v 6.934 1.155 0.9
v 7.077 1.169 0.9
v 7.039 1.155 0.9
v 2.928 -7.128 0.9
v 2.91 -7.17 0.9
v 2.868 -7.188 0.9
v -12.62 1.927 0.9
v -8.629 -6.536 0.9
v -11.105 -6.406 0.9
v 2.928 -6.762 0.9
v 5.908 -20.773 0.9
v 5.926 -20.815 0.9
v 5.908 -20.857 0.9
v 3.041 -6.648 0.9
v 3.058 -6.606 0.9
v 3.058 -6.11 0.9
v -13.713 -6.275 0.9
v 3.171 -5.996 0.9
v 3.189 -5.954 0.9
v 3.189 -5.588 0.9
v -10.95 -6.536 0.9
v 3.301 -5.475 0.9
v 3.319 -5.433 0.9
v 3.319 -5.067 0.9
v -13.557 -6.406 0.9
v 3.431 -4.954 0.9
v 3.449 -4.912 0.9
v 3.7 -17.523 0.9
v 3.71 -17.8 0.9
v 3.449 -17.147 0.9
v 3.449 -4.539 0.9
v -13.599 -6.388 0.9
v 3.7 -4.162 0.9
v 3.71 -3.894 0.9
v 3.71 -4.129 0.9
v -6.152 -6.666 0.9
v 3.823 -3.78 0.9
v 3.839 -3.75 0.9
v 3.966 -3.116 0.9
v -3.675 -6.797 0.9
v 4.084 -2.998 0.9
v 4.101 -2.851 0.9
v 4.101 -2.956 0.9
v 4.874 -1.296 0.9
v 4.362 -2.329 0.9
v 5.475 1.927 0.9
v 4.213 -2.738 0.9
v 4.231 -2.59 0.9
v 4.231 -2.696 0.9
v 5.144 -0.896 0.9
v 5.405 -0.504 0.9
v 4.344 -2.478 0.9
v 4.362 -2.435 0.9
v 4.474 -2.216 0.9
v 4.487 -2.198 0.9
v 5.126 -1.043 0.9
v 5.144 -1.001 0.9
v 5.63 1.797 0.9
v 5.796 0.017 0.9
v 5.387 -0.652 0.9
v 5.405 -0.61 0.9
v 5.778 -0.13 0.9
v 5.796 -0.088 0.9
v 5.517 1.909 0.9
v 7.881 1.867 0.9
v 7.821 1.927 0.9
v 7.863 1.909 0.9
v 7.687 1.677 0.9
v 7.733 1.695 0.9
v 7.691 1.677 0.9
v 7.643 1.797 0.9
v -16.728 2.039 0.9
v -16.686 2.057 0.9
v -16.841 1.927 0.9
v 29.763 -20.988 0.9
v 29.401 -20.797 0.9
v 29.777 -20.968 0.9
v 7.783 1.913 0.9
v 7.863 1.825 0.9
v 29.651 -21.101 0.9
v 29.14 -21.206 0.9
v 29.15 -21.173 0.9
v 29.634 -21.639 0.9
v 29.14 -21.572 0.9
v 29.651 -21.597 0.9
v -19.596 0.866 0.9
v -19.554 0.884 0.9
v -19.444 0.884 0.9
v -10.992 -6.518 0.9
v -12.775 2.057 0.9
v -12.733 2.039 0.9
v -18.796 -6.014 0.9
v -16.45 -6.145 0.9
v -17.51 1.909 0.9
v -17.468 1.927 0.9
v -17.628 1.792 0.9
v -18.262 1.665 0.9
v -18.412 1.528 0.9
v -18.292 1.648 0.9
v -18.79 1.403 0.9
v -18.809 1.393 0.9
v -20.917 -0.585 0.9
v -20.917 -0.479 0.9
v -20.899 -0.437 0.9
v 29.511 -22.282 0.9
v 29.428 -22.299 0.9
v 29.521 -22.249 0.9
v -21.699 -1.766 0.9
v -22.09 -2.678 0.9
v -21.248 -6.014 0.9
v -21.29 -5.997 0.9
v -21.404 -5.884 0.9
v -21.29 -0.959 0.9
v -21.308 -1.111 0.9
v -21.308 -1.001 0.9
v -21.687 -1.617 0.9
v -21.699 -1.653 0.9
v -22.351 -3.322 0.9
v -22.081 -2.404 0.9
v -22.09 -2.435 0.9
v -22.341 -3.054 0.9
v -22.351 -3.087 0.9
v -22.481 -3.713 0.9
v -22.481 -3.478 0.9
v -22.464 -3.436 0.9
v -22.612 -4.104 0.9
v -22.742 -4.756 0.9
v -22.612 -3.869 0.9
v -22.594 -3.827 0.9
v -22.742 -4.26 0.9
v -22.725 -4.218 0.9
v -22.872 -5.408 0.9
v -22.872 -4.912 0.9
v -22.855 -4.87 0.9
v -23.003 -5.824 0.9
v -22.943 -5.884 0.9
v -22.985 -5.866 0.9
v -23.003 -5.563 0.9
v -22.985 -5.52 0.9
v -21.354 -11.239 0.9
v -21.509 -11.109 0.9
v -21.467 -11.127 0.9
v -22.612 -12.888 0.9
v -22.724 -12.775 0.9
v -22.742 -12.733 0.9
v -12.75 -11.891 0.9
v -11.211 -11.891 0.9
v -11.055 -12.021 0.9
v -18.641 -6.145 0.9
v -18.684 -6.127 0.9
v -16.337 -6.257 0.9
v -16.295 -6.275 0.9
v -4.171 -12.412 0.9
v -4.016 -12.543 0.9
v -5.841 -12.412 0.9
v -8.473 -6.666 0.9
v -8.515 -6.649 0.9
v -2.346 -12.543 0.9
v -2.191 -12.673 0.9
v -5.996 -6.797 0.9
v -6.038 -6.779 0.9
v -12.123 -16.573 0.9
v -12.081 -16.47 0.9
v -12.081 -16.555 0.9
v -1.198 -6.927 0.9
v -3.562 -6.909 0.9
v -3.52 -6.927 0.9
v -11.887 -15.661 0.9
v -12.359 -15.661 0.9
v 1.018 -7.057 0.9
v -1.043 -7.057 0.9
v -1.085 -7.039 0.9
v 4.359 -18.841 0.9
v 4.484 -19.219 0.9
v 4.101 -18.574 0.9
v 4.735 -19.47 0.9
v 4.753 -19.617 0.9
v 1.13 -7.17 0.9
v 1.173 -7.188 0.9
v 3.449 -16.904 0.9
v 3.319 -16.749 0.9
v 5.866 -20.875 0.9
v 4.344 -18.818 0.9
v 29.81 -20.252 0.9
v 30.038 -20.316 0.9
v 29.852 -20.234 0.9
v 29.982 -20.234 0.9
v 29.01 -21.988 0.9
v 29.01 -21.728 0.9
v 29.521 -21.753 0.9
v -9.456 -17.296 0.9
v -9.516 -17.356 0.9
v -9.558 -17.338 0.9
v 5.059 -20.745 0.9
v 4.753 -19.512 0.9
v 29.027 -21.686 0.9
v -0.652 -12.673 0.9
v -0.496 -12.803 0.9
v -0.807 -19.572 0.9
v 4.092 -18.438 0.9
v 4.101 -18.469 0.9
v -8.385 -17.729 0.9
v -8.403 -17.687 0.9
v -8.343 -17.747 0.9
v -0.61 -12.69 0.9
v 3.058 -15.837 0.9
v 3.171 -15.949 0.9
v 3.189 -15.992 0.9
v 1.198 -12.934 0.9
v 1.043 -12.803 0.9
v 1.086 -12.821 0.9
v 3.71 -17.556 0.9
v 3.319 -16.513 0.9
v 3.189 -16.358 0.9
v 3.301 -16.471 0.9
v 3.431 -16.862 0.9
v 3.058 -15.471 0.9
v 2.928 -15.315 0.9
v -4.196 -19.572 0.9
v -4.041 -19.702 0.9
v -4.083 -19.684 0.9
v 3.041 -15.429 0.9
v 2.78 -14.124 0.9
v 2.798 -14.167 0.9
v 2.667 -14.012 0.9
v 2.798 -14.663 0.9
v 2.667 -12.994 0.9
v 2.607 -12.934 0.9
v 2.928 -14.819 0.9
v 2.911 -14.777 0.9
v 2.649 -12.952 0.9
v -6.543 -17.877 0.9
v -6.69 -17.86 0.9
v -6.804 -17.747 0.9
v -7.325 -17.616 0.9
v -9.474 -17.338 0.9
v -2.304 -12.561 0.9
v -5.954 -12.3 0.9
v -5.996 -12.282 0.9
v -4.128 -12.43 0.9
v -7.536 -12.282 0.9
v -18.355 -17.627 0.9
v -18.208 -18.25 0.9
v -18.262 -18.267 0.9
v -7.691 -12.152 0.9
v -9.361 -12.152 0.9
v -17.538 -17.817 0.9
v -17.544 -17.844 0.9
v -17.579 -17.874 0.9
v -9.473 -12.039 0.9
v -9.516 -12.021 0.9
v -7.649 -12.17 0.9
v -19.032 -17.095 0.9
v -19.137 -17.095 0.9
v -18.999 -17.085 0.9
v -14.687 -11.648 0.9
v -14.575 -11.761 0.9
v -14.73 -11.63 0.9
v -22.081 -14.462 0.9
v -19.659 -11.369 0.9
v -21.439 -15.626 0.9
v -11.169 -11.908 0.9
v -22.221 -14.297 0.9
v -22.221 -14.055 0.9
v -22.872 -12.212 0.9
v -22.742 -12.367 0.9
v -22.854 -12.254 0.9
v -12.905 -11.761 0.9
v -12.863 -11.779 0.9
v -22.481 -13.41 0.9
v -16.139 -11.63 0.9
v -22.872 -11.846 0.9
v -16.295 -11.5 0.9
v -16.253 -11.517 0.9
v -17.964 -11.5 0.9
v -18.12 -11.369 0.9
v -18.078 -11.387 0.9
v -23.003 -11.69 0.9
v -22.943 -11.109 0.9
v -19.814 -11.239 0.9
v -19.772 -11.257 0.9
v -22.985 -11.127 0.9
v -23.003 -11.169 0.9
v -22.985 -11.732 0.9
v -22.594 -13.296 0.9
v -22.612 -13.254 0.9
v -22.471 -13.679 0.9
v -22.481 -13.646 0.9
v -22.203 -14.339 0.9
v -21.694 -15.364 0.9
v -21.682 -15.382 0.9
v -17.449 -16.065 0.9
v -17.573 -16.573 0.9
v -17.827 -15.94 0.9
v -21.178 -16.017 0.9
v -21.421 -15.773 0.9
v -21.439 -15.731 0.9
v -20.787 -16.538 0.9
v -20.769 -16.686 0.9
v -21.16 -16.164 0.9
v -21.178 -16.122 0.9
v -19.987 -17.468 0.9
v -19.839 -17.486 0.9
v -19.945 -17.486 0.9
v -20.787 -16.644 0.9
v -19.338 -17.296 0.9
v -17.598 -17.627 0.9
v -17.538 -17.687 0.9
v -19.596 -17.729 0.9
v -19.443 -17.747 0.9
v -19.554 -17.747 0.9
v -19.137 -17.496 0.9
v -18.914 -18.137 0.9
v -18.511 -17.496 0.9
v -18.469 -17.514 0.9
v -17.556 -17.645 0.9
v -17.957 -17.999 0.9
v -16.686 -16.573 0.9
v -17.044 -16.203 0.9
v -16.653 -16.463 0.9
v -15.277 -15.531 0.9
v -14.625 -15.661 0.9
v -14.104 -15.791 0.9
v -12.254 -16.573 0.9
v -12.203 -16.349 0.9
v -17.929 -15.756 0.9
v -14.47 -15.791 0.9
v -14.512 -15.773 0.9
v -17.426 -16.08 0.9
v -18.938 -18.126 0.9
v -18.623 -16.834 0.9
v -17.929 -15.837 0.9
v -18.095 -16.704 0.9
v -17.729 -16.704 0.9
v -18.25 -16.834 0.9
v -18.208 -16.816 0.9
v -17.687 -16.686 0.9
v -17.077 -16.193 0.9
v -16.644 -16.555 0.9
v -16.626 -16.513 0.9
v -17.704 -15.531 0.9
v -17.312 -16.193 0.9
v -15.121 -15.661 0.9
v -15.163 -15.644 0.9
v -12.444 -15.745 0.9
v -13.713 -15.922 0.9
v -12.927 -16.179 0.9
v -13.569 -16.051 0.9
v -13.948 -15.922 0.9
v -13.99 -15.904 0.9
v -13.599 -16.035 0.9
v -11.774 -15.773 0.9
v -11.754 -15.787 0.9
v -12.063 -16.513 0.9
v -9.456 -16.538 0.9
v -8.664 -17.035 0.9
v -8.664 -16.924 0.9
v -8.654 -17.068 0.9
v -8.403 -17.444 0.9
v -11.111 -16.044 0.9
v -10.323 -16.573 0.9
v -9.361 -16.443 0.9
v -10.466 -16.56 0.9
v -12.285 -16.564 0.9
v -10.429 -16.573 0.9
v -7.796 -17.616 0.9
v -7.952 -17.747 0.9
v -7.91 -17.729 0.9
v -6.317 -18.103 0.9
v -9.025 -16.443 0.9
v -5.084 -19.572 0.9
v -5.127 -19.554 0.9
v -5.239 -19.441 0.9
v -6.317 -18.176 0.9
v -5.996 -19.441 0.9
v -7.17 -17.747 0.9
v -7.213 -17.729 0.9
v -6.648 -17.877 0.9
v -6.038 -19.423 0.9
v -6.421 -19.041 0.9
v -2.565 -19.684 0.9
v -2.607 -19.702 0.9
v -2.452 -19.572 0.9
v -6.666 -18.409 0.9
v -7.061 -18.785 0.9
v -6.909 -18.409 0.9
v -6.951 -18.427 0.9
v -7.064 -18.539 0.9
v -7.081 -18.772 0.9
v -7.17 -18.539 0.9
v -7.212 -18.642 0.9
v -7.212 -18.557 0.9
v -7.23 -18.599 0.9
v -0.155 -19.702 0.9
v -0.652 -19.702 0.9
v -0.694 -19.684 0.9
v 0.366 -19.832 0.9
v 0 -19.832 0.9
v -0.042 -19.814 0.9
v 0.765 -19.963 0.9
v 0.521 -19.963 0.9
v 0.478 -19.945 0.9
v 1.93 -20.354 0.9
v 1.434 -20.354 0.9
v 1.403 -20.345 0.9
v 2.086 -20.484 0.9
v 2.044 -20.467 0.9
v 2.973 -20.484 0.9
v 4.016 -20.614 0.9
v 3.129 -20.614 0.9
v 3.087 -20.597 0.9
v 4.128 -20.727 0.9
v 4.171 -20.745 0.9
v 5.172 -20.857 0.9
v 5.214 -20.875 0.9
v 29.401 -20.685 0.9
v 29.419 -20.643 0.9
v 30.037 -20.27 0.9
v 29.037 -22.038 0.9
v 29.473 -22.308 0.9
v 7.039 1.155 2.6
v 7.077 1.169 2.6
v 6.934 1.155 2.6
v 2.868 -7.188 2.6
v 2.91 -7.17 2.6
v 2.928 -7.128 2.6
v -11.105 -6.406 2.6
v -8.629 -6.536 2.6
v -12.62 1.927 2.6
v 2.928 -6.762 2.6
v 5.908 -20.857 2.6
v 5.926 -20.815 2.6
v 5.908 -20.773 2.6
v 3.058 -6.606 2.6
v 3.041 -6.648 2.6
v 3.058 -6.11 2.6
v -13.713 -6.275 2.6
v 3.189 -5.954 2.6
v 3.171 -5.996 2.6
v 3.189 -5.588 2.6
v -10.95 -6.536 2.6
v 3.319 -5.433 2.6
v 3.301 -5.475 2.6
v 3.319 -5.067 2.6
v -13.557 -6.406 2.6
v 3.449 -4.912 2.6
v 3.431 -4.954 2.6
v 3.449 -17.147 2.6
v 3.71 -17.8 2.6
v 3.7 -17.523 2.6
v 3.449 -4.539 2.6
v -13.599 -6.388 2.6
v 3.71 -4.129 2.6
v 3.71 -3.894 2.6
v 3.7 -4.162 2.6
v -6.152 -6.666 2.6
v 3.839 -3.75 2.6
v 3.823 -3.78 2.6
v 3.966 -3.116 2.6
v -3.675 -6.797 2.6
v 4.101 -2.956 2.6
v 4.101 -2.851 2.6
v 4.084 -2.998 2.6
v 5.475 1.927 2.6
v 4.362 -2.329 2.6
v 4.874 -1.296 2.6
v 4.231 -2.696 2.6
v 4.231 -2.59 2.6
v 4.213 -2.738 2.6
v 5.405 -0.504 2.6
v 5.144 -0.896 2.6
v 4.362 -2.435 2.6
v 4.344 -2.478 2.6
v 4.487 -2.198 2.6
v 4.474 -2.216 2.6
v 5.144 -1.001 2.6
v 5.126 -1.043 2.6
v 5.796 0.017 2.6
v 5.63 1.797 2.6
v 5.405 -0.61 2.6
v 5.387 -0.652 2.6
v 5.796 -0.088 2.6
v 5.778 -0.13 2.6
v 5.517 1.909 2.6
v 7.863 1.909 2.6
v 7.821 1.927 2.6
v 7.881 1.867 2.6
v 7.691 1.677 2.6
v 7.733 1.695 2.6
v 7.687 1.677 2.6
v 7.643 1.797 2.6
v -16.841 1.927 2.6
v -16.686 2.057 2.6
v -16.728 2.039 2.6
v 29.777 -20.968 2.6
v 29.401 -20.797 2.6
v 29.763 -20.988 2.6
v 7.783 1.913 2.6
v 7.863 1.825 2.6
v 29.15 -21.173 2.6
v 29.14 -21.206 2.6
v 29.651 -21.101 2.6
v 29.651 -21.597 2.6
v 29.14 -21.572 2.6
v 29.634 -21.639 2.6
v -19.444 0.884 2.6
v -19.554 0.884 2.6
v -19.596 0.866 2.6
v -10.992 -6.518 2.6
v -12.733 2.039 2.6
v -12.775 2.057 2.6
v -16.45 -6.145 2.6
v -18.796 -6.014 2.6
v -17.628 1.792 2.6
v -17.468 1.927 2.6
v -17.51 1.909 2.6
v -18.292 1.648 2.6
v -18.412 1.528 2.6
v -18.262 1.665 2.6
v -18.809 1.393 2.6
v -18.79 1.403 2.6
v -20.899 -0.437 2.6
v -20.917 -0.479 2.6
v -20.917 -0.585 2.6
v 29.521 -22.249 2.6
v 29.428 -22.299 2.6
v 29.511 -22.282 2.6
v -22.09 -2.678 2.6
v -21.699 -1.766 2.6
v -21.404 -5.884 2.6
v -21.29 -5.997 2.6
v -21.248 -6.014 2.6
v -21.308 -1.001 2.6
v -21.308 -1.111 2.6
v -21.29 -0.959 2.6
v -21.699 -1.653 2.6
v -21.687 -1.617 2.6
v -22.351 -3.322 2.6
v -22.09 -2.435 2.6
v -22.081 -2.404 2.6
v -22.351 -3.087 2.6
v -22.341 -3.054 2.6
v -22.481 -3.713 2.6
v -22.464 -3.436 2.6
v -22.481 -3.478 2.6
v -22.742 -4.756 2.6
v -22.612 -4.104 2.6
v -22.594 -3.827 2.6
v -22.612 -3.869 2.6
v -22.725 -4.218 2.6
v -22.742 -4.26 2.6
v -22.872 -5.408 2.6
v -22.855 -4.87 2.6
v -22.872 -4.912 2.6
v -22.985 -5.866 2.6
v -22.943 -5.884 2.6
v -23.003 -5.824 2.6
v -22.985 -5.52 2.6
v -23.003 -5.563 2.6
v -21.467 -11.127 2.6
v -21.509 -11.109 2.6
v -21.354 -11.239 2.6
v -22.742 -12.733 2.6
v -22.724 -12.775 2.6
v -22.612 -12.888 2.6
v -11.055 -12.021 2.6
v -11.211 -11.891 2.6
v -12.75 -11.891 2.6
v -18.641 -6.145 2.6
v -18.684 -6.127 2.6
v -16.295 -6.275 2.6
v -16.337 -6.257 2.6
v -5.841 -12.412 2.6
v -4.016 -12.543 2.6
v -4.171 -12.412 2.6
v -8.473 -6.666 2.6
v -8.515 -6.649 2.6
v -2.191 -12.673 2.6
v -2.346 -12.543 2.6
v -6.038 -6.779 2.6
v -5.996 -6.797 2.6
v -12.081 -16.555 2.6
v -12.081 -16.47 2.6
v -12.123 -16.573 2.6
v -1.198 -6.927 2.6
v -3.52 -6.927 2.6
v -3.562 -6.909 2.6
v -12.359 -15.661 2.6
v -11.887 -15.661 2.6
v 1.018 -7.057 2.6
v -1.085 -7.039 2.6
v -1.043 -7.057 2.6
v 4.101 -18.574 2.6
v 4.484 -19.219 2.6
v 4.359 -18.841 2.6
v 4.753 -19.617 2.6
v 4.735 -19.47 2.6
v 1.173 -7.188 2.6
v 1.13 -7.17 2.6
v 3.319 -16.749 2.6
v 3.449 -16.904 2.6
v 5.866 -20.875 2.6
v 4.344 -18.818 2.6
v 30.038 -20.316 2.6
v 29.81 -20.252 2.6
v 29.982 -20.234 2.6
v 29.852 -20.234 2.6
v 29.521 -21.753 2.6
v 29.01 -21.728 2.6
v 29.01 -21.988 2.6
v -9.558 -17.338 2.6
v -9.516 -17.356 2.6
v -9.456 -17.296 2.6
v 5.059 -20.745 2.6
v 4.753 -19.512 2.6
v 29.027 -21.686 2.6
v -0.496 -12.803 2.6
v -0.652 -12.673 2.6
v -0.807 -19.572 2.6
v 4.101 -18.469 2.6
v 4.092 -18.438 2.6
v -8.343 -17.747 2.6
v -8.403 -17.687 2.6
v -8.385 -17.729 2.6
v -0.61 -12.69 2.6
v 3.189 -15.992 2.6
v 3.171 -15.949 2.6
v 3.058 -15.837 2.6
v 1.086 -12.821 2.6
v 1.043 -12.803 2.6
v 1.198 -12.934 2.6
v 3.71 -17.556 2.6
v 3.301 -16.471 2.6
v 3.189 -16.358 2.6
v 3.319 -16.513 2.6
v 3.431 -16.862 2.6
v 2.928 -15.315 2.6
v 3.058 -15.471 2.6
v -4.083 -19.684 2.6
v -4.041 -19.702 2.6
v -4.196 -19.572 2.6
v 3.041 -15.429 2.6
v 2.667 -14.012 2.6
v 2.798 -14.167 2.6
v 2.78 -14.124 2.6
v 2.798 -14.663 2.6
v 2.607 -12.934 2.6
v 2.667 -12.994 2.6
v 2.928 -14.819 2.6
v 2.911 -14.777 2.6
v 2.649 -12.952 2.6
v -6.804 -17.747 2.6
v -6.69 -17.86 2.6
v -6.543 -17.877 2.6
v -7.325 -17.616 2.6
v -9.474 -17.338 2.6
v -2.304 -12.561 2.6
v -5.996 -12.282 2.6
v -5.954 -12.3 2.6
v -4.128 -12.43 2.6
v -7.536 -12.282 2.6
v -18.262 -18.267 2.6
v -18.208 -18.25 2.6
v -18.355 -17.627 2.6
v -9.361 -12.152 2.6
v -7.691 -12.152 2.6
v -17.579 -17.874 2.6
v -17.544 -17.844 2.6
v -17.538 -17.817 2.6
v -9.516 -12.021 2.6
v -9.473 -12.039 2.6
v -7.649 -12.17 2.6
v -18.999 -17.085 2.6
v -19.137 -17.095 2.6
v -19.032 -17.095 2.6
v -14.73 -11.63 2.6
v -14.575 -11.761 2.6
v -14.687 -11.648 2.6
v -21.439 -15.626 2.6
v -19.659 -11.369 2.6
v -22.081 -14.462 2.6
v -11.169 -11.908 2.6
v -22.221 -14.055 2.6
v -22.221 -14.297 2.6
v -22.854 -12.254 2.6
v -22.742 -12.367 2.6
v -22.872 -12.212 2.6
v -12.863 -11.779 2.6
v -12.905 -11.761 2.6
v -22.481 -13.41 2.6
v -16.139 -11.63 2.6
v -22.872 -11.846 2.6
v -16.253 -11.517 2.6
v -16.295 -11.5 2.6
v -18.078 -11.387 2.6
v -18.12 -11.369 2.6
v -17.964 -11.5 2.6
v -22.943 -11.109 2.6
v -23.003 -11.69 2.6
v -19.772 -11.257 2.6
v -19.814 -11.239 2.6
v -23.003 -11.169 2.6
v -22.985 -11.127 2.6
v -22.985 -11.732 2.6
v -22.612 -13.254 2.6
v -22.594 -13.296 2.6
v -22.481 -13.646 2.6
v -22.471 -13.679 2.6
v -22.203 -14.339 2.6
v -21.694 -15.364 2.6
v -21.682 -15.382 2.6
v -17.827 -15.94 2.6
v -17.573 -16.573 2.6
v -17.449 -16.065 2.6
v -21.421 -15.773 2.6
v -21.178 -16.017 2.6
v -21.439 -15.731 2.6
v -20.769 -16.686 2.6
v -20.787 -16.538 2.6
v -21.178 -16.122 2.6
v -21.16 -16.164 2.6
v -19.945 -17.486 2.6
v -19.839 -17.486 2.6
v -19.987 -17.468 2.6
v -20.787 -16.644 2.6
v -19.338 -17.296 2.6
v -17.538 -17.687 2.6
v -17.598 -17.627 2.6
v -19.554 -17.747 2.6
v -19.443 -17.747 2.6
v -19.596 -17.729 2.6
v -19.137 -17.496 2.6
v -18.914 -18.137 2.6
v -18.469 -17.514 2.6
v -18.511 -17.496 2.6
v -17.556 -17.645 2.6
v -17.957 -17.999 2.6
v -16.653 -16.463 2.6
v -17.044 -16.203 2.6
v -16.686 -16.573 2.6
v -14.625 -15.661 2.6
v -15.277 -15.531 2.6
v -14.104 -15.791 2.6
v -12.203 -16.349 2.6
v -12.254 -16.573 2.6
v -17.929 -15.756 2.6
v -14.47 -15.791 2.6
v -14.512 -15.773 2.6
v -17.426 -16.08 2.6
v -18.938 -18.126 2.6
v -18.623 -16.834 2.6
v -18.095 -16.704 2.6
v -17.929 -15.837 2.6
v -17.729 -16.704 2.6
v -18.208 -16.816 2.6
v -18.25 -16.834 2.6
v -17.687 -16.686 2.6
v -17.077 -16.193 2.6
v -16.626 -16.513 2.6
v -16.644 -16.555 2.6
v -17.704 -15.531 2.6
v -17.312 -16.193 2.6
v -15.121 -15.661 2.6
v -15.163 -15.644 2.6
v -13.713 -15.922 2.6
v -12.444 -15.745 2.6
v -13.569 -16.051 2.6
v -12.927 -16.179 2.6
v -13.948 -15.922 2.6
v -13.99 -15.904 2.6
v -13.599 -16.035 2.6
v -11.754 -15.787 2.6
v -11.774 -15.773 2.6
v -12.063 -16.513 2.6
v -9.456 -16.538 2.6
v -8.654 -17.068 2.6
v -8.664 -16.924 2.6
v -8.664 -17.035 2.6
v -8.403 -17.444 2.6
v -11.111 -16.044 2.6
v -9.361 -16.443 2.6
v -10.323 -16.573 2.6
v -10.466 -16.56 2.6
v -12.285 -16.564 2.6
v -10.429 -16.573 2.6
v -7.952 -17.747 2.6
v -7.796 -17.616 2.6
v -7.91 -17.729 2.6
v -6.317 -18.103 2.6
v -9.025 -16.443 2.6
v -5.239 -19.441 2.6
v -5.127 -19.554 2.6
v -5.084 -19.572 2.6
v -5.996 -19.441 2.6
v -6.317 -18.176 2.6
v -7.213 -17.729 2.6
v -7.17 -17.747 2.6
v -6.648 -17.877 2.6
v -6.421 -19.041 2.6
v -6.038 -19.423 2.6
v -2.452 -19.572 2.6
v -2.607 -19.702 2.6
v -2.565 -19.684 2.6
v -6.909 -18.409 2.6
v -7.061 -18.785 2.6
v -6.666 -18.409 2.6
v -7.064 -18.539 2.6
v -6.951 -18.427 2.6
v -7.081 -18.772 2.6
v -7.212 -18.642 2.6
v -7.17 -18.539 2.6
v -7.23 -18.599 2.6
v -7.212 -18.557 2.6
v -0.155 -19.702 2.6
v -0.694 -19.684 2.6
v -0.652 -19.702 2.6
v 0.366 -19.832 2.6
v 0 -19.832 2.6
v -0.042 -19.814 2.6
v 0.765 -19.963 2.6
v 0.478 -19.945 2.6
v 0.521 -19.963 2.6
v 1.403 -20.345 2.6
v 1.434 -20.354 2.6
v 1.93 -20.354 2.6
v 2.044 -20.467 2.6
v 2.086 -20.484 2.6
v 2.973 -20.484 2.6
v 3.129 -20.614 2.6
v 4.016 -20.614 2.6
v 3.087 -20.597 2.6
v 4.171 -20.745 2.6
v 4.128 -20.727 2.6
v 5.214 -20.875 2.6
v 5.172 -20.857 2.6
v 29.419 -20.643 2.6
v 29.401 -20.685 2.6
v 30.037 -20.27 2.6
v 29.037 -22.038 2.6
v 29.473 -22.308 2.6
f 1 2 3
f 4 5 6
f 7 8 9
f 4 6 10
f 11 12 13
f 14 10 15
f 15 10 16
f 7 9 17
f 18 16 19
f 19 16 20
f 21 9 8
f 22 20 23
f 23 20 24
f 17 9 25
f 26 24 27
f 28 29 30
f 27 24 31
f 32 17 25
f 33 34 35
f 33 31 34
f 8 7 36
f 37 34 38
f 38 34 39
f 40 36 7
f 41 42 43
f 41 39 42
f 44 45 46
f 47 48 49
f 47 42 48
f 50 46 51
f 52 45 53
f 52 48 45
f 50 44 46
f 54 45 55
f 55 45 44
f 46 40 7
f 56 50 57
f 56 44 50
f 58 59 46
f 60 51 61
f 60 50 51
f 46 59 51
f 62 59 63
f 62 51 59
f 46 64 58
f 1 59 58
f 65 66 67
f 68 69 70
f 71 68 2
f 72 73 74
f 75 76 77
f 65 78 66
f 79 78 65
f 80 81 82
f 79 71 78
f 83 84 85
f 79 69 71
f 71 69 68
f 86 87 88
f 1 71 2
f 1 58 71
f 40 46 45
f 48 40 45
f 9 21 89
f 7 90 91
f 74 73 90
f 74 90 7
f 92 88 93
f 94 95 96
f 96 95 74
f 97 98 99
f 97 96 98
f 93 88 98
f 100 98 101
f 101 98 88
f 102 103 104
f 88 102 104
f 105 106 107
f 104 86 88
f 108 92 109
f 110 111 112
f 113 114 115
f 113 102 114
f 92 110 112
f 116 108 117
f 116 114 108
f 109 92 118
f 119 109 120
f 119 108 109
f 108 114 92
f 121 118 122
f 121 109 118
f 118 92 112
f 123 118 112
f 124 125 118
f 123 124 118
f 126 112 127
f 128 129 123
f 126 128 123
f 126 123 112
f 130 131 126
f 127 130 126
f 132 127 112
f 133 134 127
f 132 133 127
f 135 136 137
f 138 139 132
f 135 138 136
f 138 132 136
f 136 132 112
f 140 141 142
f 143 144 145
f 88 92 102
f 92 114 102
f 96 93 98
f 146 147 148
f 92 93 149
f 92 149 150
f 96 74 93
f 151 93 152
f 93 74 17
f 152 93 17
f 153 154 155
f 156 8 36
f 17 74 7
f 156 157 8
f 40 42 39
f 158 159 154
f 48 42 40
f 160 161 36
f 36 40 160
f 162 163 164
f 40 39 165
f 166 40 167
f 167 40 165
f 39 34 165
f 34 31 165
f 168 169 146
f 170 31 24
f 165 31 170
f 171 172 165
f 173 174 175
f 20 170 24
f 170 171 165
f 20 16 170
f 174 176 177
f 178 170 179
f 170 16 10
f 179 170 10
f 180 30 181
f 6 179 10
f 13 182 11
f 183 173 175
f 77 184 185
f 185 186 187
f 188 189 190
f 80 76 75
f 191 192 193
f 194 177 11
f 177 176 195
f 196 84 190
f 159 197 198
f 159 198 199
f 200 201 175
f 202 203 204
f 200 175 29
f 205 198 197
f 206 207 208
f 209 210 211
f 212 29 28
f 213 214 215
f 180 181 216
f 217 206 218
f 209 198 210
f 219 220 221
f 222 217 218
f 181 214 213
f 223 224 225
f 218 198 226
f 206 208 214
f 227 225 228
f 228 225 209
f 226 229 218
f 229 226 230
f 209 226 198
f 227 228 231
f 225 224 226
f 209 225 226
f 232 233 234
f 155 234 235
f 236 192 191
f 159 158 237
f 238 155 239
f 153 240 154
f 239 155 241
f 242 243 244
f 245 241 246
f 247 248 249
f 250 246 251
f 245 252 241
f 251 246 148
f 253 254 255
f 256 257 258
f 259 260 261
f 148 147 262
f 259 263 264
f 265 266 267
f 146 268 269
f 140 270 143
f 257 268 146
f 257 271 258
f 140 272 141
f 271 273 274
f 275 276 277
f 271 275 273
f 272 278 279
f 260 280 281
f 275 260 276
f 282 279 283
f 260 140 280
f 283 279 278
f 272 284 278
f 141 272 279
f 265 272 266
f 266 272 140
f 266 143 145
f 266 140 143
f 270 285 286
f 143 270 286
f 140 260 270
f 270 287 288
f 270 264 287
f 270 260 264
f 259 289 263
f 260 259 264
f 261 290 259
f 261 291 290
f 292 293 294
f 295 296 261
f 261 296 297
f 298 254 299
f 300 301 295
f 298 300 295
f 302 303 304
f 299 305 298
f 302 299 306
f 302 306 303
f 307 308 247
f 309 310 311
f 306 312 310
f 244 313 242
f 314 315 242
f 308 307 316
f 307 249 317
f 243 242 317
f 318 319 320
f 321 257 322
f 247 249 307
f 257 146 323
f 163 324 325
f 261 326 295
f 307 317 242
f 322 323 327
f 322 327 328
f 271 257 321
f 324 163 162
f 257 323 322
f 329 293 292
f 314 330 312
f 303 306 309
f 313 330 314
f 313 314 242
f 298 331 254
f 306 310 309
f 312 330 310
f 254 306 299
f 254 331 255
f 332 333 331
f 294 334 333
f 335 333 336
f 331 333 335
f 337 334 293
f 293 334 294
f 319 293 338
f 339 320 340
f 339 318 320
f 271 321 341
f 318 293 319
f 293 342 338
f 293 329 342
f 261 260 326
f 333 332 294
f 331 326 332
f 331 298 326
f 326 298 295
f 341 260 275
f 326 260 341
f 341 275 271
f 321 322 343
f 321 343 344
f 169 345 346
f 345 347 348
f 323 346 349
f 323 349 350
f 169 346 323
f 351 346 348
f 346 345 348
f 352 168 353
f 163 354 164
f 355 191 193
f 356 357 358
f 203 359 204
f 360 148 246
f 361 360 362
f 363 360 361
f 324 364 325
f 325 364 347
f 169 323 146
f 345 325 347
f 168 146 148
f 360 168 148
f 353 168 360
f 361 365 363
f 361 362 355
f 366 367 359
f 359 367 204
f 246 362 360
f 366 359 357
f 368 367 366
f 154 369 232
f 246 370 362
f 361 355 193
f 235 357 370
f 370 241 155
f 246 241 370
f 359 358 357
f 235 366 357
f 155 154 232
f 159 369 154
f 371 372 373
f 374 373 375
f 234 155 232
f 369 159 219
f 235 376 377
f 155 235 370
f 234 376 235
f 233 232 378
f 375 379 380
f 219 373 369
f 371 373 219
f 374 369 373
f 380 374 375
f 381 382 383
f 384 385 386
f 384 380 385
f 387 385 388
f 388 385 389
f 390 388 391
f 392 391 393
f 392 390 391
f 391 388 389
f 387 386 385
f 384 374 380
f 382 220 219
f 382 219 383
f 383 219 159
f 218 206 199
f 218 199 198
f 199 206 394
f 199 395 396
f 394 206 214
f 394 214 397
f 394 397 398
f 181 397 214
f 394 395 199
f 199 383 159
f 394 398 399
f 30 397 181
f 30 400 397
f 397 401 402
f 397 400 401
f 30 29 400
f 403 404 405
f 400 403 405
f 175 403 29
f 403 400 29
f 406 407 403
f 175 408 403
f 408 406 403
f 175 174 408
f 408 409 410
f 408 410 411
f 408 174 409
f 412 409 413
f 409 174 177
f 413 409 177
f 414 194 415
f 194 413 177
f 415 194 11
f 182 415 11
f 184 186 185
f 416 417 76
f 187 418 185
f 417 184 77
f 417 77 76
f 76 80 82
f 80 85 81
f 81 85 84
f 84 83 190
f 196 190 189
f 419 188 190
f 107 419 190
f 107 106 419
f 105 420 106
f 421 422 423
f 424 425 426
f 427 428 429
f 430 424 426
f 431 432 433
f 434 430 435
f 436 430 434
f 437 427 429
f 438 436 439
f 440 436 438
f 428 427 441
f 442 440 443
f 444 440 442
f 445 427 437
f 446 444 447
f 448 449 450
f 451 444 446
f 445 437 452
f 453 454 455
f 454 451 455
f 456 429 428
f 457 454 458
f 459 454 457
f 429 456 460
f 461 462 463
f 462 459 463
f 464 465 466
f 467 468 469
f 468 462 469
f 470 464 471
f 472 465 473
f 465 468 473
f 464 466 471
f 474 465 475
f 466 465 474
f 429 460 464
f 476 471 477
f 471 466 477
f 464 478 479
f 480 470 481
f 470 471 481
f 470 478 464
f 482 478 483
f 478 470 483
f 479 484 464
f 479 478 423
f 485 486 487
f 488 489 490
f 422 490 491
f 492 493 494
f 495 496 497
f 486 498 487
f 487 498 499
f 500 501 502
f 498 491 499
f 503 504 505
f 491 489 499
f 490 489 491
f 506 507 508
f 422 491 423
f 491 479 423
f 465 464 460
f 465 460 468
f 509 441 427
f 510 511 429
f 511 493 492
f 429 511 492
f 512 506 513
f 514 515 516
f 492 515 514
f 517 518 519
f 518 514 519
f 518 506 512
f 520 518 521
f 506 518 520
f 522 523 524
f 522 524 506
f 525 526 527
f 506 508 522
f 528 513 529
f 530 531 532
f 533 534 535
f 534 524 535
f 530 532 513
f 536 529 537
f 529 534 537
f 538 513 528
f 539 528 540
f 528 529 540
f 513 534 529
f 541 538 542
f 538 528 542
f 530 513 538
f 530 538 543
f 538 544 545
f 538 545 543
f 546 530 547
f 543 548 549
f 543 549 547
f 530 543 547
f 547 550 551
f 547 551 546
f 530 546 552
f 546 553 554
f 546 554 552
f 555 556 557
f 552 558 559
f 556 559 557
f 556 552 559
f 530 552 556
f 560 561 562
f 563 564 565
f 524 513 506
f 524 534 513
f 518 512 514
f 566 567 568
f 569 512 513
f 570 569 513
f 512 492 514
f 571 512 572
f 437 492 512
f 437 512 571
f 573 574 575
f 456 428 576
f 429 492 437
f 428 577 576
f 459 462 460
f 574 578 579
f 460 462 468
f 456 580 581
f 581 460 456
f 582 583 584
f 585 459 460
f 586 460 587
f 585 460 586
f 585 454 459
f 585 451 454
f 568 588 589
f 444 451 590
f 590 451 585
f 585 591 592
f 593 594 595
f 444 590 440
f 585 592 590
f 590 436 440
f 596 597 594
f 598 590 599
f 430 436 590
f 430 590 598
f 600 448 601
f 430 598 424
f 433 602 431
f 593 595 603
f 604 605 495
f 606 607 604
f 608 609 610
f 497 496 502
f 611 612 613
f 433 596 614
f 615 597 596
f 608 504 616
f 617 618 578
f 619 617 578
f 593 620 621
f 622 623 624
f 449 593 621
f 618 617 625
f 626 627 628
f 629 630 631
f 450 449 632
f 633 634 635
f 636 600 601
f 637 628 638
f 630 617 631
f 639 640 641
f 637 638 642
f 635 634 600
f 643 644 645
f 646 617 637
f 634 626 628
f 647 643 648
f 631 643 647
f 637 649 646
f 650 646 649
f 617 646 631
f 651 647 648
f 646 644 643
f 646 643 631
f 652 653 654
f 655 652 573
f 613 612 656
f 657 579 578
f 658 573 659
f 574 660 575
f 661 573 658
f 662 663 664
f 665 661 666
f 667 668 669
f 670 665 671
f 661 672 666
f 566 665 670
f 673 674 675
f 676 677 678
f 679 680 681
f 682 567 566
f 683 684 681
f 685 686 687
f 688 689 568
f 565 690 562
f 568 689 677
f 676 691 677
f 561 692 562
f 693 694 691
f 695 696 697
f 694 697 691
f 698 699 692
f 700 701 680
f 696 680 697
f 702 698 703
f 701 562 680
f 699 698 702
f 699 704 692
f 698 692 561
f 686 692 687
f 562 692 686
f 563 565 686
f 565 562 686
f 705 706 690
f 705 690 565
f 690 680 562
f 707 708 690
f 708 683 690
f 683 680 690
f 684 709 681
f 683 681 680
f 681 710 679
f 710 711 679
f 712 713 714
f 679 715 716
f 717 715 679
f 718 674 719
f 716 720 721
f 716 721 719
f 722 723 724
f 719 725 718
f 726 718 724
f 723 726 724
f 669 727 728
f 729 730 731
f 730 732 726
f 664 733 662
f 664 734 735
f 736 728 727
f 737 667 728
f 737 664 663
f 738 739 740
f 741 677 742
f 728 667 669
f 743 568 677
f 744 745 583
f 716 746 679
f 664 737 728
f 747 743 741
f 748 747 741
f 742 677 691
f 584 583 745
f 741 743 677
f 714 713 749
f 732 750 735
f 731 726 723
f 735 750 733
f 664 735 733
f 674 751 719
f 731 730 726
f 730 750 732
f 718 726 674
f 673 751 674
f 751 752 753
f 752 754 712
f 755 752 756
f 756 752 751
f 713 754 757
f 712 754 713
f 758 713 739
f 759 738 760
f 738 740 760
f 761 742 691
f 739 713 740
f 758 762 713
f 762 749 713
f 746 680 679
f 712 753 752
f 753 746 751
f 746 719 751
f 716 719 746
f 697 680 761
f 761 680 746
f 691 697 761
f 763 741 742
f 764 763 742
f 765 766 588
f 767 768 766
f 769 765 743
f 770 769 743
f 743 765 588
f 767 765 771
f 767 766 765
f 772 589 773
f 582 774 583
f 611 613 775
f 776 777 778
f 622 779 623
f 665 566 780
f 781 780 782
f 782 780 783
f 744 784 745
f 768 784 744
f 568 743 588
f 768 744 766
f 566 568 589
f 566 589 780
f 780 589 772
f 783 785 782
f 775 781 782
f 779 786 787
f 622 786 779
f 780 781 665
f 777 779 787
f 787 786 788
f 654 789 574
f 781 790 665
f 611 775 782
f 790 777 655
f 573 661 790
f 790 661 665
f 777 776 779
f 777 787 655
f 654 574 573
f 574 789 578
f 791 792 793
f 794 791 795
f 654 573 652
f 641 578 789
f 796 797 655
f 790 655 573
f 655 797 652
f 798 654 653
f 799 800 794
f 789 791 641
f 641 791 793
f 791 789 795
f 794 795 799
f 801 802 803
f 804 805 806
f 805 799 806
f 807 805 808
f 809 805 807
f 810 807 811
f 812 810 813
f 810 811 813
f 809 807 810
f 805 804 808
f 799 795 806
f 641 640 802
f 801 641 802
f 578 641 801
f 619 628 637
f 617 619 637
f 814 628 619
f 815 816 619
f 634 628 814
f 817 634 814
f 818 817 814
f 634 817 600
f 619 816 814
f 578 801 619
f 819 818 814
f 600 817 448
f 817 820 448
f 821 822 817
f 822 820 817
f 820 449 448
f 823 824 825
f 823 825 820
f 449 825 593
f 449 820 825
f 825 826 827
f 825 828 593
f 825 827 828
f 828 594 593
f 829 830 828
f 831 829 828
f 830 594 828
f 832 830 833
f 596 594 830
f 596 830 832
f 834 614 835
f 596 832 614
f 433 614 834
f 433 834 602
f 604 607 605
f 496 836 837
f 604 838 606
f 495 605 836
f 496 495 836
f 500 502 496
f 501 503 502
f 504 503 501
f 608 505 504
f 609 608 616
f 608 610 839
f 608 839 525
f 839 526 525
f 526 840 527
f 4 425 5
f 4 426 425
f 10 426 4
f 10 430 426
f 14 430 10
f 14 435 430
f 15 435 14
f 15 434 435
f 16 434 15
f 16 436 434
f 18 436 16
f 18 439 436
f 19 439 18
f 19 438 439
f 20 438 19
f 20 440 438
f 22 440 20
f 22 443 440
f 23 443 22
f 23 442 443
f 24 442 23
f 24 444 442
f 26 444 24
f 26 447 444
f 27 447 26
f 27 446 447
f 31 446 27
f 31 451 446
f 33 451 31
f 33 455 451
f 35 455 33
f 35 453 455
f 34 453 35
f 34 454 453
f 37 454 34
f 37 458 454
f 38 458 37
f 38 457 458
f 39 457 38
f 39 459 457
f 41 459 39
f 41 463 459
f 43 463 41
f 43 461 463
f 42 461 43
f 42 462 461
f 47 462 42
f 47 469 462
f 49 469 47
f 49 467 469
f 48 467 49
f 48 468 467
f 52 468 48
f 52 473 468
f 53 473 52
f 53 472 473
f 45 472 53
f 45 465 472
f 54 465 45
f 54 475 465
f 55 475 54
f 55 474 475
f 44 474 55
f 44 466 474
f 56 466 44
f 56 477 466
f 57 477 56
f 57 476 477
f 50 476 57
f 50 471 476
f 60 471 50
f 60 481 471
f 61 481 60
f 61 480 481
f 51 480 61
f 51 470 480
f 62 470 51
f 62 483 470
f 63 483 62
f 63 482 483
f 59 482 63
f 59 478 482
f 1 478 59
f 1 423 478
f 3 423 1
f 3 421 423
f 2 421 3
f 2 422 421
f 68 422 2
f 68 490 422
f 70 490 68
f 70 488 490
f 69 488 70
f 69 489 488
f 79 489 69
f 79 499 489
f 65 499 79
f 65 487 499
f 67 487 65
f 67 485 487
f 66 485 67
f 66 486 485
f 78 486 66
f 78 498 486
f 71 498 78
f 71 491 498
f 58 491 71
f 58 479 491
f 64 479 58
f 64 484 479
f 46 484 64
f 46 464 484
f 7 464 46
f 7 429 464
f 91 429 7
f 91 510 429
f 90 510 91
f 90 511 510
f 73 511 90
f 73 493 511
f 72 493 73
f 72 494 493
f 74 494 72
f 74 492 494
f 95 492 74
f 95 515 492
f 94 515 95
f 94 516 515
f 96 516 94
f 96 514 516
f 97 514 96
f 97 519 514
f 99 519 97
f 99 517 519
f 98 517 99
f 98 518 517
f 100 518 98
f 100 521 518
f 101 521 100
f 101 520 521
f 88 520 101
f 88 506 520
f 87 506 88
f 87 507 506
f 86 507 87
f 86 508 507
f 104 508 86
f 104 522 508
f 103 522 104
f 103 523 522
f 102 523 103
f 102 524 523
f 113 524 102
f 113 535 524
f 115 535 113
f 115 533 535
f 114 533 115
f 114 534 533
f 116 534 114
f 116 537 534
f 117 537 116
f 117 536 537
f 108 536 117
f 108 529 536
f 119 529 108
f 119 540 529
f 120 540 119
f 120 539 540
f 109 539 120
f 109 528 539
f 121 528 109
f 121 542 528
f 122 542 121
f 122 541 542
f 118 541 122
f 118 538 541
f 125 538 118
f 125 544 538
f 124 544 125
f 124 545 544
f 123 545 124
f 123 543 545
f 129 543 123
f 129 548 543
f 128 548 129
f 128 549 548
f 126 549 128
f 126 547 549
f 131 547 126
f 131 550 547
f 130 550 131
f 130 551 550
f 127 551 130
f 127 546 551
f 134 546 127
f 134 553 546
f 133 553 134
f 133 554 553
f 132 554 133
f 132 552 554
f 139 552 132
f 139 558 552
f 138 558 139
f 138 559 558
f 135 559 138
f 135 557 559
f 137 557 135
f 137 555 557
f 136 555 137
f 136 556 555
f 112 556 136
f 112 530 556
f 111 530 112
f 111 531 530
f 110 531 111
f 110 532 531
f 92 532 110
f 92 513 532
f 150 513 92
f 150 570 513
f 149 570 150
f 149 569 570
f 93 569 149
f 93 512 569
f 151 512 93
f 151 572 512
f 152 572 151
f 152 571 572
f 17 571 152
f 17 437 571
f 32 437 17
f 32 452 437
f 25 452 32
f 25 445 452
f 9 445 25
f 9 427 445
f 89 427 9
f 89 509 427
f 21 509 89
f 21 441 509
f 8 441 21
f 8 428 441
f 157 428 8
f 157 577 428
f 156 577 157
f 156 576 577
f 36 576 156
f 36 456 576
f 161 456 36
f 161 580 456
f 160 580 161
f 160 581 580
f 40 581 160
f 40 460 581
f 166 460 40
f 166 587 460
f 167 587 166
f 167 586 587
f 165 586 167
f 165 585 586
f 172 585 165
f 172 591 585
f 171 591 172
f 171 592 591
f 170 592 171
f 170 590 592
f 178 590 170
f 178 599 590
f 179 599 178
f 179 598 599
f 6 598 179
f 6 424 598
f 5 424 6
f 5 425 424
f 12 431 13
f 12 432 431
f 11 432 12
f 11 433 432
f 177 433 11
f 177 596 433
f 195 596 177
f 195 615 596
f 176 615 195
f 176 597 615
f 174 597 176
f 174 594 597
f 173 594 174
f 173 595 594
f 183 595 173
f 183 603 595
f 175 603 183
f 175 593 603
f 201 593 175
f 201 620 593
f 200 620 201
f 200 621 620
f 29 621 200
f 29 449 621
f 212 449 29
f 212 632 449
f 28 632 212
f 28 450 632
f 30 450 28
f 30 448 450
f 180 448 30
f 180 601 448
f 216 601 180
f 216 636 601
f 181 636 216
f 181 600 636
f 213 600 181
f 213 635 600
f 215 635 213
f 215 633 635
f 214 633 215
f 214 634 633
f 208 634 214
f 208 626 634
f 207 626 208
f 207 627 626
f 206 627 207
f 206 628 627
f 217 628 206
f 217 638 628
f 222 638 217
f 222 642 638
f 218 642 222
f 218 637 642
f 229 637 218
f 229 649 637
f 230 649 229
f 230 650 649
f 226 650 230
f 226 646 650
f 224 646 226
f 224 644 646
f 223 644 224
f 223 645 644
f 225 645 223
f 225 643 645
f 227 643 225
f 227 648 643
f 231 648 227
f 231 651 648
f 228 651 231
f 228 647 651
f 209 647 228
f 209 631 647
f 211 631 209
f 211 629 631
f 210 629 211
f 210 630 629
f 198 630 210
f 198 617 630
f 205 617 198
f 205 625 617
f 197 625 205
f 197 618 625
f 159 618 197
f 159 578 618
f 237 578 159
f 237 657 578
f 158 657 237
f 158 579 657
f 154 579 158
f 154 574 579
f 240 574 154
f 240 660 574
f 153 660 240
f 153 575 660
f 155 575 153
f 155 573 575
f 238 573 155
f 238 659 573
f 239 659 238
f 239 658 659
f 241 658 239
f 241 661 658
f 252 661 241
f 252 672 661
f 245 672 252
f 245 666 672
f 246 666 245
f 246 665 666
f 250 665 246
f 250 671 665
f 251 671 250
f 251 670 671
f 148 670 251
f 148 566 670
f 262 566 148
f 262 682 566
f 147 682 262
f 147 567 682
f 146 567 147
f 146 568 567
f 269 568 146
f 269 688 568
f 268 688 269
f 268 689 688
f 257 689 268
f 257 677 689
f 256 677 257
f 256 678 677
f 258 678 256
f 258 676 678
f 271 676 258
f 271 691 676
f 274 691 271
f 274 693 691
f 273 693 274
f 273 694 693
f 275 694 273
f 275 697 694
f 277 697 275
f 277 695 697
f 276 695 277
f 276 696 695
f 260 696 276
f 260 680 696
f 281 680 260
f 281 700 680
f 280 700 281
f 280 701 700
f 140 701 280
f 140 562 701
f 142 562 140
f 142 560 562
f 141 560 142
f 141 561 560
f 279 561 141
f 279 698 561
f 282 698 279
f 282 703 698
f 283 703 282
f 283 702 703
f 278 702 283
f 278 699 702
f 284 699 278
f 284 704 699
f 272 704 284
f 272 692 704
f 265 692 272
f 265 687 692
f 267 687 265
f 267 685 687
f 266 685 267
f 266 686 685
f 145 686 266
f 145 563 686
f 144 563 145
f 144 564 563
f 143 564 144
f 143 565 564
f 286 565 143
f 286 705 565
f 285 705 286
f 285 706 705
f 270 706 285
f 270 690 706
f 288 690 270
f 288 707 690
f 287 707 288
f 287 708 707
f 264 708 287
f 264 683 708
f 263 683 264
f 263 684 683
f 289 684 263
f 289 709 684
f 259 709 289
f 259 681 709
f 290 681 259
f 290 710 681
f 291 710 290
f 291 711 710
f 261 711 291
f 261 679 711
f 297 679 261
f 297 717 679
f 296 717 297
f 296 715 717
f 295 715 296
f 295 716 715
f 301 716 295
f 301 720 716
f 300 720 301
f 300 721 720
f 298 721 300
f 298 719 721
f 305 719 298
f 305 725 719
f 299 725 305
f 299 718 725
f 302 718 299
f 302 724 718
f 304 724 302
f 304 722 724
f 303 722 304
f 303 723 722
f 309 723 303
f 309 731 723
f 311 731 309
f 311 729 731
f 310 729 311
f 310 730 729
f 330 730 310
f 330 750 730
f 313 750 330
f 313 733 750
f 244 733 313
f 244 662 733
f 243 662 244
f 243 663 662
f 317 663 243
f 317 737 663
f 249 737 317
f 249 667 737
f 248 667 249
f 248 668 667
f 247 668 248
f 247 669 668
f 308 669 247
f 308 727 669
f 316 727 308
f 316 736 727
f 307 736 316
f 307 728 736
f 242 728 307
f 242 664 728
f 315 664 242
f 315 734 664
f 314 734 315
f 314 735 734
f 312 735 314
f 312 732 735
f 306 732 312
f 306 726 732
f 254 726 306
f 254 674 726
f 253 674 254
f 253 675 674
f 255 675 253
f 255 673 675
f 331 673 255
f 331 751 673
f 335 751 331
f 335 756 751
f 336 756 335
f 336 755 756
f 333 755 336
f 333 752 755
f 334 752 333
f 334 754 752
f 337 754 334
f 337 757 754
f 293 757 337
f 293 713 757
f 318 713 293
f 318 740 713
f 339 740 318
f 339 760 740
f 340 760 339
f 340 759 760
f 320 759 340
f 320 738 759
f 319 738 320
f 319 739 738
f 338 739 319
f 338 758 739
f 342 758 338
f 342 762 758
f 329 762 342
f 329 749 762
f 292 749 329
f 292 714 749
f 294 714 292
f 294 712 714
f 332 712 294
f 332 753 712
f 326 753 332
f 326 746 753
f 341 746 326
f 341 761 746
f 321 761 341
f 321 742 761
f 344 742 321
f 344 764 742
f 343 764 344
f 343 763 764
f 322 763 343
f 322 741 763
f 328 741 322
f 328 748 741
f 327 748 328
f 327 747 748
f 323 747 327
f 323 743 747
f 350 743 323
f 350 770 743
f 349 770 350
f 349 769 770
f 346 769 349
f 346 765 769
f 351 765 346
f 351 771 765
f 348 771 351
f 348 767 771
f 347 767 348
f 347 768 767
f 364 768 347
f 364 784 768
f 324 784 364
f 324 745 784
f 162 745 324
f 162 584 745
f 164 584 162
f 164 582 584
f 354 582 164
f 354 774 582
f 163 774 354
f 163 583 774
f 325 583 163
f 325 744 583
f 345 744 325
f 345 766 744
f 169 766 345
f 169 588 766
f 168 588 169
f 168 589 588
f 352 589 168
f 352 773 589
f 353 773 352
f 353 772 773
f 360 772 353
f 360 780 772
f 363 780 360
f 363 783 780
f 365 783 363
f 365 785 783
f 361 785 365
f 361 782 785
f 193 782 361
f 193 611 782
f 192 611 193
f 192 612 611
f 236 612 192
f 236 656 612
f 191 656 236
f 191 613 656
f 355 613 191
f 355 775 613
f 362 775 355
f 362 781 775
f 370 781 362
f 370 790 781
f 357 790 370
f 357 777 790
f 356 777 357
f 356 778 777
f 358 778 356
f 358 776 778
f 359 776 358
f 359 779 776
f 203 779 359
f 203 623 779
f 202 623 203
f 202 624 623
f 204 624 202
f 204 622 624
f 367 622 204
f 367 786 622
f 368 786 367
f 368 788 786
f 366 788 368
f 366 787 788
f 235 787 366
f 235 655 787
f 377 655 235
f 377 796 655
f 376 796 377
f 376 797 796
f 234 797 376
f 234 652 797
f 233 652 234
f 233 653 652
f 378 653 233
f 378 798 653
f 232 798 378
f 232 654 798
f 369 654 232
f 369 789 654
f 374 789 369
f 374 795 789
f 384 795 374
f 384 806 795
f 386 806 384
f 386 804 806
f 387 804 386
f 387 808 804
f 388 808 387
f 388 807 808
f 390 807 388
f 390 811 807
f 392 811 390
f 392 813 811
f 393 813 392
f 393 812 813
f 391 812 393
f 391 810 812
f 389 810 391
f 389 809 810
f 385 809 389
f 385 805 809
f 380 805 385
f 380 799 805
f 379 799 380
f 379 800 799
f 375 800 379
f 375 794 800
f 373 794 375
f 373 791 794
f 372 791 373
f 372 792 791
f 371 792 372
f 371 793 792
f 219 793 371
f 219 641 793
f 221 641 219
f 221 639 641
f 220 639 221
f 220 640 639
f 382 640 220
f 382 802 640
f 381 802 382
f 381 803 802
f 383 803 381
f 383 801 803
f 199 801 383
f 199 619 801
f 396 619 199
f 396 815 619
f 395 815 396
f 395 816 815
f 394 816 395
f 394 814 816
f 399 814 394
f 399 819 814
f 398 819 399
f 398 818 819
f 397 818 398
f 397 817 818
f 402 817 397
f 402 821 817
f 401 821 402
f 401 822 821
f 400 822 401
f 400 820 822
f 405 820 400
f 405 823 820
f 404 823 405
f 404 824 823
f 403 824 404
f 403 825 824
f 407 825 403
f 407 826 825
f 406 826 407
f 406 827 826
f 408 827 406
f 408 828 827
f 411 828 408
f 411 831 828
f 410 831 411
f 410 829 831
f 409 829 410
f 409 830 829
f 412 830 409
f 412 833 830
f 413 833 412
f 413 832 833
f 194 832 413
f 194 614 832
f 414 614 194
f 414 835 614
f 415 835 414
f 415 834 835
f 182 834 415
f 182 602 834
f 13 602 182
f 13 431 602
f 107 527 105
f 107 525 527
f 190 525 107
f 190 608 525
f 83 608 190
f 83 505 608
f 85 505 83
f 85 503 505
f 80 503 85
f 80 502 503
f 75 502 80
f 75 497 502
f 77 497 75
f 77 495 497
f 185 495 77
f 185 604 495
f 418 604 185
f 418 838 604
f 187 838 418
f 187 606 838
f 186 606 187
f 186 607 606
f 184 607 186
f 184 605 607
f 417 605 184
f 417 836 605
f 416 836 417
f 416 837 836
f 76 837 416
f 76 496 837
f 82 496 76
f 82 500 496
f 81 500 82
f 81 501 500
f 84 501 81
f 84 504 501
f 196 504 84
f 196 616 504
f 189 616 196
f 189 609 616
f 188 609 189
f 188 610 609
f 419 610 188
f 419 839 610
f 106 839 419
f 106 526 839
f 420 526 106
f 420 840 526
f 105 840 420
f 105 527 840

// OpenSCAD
$fn = 24;
translate([0, -2.500, 0.900])
  linear_extrude(height=1.700) {
offset(r=0.06, $fn=8) {
    polygon(points=[[29.982,-17.794],[29.852,-17.794],[29.461,-18.185],[29.461,-18.315],[29.200,-18.706],[29.200,-19.097],[29.070,-19.228],[29.070,-19.488],[29.461,-19.749],[29.461,-19.228],[29.591,-19.097],[29.591,-18.576],[29.721,-18.446]], paths=[[0,1,2,3,4,5,6,7,8,9,10,11,12]]);
    polygon(points=[[-22.943,-8.669],[-22.943,-9.190],[-22.812,-9.321],[-22.812,-9.712],[-22.682,-9.842],[-22.682,-10.233],[-22.552,-10.363],[-22.552,-10.754],[-22.421,-10.885],[-22.421,-11.146],[-22.161,-11.537],[-22.161,-11.797],[-22.030,-11.928],[-21.639,-12.840],[-21.379,-13.101],[-21.379,-13.231],[-21.118,-13.492],[-21.118,-13.622],[-20.727,-14.013],[-20.727,-14.144],[-19.945,-14.926],[-19.814,-14.926],[-19.554,-15.187],[-19.423,-15.187],[-18.902,-15.578],[-18.250,-15.708],[-17.989,-15.447],[-17.598,-15.317],[-17.598,-15.187],[-18.380,-15.187],[-18.511,-15.056],[-19.162,-15.056],[-19.423,-14.796],[-19.162,-14.535],[-19.032,-14.535],[-18.641,-14.274],[-18.250,-14.274],[-18.120,-14.144],[-17.729,-14.144],[-17.598,-14.013],[-16.686,-14.013],[-17.077,-13.753],[-17.337,-13.753],[-17.468,-13.622],[-17.859,-13.492],[-17.989,-13.362],[-17.989,-13.231],[-17.729,-12.971],[-15.252,-12.971],[-15.121,-13.101],[-14.600,-13.101],[-14.470,-13.231],[-14.079,-13.231],[-13.948,-13.362],[-13.688,-13.362],[-13.557,-13.492],[-12.905,-13.622],[-12.254,-14.013],[-12.123,-14.013],[-12.254,-13.883],[-12.514,-13.231],[-12.384,-13.101],[-11.862,-13.101],[-11.732,-13.231],[-11.080,-13.492],[-10.429,-14.013],[-10.298,-14.013],[-9.516,-14.796],[-9.516,-14.013],[-9.386,-13.883],[-8.995,-13.883],[-8.604,-14.404],[-8.604,-14.535],[-8.343,-14.926],[-8.343,-15.187],[-7.952,-15.187],[-7.821,-15.056],[-7.300,-15.056],[-7.170,-15.187],[-6.779,-15.187],[-6.648,-15.317],[-6.518,-15.317],[-6.257,-15.578],[-6.257,-15.708],[-6.648,-15.969],[-6.909,-15.969],[-7.039,-16.099],[-7.170,-16.099],[-7.039,-16.229],[-6.387,-16.490],[-5.996,-16.881],[-5.214,-16.881],[-5.084,-17.012],[-4.171,-17.012],[-4.041,-17.142],[-2.607,-17.142],[-2.477,-17.012],[-0.782,-17.012],[-0.652,-17.142],[-0.130,-17.142],[0.000,-17.272],[0.391,-17.272],[0.521,-17.403],[0.782,-17.403],[1.434,-17.794],[1.955,-17.794],[2.086,-17.924],[2.998,-17.924],[3.129,-18.054],[4.041,-18.054],[4.171,-18.185],[5.084,-18.185],[5.214,-18.315],[5.866,-18.315],[4.693,-17.142],[4.693,-17.012],[4.432,-16.751],[4.302,-16.360],[4.041,-16.099],[4.041,-15.969],[3.650,-15.317],[3.650,-15.056],[3.389,-14.665],[3.389,-14.404],[3.259,-14.274],[3.259,-14.013],[3.129,-13.883],[3.129,-13.492],[2.998,-13.362],[2.998,-12.971],[2.868,-12.840],[2.868,-12.319],[2.738,-12.188],[2.738,-11.667],[2.607,-11.537],[2.607,-10.494],[1.173,-10.494],[1.043,-10.363],[-0.521,-10.363],[-0.652,-10.233],[-2.216,-10.233],[-2.346,-10.103],[-4.041,-10.103],[-4.171,-9.972],[-5.866,-9.972],[-5.996,-9.842],[-7.561,-9.842],[-7.691,-9.712],[-9.386,-9.712],[-9.516,-9.581],[-11.080,-9.581],[-11.211,-9.451],[-12.775,-9.451],[-12.905,-9.321],[-14.600,-9.321],[-14.730,-9.190],[-16.164,-9.190],[-16.295,-9.060],[-17.989,-9.060],[-18.120,-8.929],[-19.684,-8.929],[-19.814,-8.799],[-21.379,-8.799],[-21.509,-8.669]], paths=[[0,1,2,3,4,5,6,7,8,9,10,11,12,13,14,15,16,17,18,19,20,21,22,23,24,25,26,27,28,29,30,31,32,33,34,35,36,37,38,39,40,41,42,43,44,45,46,47,48,49,50,51,52,53,54,55,56,57,58,59,60,61,62,63,64,65,66,67,68,69,70,71,72,73,74,75,76,77,78,79,80,81,82,83,84,85,86,87,88,89,90,91,92,93,94,95,96,97,98,99,100,101,102,103,104,105,106,107,108,109,110,111,112,113,114,115,116,117,118,119,120,121,122,123,124,125,126,127,128,129,130,131,132,133,134,135,136,137,138,139,140,141,142,143,144,145,146,147,148,149,150,151,152,153,154,155,156,157,158,159,160,161,162,163]]);
    polygon(points=[[-22.943,-3.324],[-21.379,-3.324],[-21.248,-3.454],[-18.771,-3.454],[-18.641,-3.585],[-16.425,-3.585],[-16.295,-3.715],[-13.688,-3.715],[-13.557,-3.846],[-11.080,-3.846],[-10.950,-3.976],[-8.604,-3.976],[-8.473,-4.106],[-6.127,-4.106],[-5.996,-4.237],[-3.650,-4.237],[-3.520,-4.367],[-1.173,-4.367],[-1.043,-4.497],[1.043,-4.497],[1.173,-4.628],[2.868,-4.628],[2.868,-4.237],[2.998,-4.106],[2.998,-3.585],[3.129,-3.454],[3.129,-3.063],[3.259,-2.933],[3.259,-2.542],[3.389,-2.412],[3.389,-2.021],[3.650,-1.629],[3.650,-1.369],[3.780,-1.238],[3.911,-0.587],[4.041,-0.456],[4.041,-0.326],[4.171,-0.196],[4.171,-0.065],[4.302,0.065],[4.302,0.196],[4.432,0.326],[4.823,1.238],[5.084,1.499],[5.084,1.629],[5.345,1.890],[5.345,2.021],[5.736,2.412],[5.736,2.542],[6.909,3.715],[7.039,3.715],[7.821,4.367],[7.691,4.237],[5.605,4.237],[5.475,4.367],[-12.645,4.367],[-12.775,4.497],[-16.686,4.497],[-16.816,4.367],[-17.468,4.367],[-17.598,4.237],[-18.250,4.106],[-18.380,3.976],[-18.771,3.846],[-19.423,3.324],[-19.554,3.324],[-20.857,2.021],[-20.857,1.890],[-21.248,1.499],[-21.248,1.369],[-21.639,0.847],[-21.639,0.717],[-22.030,0.065],[-22.030,-0.196],[-22.291,-0.587],[-22.291,-0.847],[-22.421,-0.978],[-22.421,-1.238],[-22.552,-1.369],[-22.552,-1.629],[-22.682,-1.760],[-22.682,-2.281],[-22.812,-2.412],[-22.812,-2.933],[-22.943,-3.063]], paths=[[0,1,2,3,4,5,6,7,8,9,10,11,12,13,14,15,16,17,18,19,20,21,22,23,24,25,26,27,28,29,30,31,32,33,34,35,36,37,38,39,40,41,42,43,44,45,46,47,48,49,50,51,52,53,54,55,56,57,58,59,60,61,62,63,64,65,66,67,68,69,70,71,72,73,74,75,76,77,78,79,80,81,82,83,84]]);
}
}
